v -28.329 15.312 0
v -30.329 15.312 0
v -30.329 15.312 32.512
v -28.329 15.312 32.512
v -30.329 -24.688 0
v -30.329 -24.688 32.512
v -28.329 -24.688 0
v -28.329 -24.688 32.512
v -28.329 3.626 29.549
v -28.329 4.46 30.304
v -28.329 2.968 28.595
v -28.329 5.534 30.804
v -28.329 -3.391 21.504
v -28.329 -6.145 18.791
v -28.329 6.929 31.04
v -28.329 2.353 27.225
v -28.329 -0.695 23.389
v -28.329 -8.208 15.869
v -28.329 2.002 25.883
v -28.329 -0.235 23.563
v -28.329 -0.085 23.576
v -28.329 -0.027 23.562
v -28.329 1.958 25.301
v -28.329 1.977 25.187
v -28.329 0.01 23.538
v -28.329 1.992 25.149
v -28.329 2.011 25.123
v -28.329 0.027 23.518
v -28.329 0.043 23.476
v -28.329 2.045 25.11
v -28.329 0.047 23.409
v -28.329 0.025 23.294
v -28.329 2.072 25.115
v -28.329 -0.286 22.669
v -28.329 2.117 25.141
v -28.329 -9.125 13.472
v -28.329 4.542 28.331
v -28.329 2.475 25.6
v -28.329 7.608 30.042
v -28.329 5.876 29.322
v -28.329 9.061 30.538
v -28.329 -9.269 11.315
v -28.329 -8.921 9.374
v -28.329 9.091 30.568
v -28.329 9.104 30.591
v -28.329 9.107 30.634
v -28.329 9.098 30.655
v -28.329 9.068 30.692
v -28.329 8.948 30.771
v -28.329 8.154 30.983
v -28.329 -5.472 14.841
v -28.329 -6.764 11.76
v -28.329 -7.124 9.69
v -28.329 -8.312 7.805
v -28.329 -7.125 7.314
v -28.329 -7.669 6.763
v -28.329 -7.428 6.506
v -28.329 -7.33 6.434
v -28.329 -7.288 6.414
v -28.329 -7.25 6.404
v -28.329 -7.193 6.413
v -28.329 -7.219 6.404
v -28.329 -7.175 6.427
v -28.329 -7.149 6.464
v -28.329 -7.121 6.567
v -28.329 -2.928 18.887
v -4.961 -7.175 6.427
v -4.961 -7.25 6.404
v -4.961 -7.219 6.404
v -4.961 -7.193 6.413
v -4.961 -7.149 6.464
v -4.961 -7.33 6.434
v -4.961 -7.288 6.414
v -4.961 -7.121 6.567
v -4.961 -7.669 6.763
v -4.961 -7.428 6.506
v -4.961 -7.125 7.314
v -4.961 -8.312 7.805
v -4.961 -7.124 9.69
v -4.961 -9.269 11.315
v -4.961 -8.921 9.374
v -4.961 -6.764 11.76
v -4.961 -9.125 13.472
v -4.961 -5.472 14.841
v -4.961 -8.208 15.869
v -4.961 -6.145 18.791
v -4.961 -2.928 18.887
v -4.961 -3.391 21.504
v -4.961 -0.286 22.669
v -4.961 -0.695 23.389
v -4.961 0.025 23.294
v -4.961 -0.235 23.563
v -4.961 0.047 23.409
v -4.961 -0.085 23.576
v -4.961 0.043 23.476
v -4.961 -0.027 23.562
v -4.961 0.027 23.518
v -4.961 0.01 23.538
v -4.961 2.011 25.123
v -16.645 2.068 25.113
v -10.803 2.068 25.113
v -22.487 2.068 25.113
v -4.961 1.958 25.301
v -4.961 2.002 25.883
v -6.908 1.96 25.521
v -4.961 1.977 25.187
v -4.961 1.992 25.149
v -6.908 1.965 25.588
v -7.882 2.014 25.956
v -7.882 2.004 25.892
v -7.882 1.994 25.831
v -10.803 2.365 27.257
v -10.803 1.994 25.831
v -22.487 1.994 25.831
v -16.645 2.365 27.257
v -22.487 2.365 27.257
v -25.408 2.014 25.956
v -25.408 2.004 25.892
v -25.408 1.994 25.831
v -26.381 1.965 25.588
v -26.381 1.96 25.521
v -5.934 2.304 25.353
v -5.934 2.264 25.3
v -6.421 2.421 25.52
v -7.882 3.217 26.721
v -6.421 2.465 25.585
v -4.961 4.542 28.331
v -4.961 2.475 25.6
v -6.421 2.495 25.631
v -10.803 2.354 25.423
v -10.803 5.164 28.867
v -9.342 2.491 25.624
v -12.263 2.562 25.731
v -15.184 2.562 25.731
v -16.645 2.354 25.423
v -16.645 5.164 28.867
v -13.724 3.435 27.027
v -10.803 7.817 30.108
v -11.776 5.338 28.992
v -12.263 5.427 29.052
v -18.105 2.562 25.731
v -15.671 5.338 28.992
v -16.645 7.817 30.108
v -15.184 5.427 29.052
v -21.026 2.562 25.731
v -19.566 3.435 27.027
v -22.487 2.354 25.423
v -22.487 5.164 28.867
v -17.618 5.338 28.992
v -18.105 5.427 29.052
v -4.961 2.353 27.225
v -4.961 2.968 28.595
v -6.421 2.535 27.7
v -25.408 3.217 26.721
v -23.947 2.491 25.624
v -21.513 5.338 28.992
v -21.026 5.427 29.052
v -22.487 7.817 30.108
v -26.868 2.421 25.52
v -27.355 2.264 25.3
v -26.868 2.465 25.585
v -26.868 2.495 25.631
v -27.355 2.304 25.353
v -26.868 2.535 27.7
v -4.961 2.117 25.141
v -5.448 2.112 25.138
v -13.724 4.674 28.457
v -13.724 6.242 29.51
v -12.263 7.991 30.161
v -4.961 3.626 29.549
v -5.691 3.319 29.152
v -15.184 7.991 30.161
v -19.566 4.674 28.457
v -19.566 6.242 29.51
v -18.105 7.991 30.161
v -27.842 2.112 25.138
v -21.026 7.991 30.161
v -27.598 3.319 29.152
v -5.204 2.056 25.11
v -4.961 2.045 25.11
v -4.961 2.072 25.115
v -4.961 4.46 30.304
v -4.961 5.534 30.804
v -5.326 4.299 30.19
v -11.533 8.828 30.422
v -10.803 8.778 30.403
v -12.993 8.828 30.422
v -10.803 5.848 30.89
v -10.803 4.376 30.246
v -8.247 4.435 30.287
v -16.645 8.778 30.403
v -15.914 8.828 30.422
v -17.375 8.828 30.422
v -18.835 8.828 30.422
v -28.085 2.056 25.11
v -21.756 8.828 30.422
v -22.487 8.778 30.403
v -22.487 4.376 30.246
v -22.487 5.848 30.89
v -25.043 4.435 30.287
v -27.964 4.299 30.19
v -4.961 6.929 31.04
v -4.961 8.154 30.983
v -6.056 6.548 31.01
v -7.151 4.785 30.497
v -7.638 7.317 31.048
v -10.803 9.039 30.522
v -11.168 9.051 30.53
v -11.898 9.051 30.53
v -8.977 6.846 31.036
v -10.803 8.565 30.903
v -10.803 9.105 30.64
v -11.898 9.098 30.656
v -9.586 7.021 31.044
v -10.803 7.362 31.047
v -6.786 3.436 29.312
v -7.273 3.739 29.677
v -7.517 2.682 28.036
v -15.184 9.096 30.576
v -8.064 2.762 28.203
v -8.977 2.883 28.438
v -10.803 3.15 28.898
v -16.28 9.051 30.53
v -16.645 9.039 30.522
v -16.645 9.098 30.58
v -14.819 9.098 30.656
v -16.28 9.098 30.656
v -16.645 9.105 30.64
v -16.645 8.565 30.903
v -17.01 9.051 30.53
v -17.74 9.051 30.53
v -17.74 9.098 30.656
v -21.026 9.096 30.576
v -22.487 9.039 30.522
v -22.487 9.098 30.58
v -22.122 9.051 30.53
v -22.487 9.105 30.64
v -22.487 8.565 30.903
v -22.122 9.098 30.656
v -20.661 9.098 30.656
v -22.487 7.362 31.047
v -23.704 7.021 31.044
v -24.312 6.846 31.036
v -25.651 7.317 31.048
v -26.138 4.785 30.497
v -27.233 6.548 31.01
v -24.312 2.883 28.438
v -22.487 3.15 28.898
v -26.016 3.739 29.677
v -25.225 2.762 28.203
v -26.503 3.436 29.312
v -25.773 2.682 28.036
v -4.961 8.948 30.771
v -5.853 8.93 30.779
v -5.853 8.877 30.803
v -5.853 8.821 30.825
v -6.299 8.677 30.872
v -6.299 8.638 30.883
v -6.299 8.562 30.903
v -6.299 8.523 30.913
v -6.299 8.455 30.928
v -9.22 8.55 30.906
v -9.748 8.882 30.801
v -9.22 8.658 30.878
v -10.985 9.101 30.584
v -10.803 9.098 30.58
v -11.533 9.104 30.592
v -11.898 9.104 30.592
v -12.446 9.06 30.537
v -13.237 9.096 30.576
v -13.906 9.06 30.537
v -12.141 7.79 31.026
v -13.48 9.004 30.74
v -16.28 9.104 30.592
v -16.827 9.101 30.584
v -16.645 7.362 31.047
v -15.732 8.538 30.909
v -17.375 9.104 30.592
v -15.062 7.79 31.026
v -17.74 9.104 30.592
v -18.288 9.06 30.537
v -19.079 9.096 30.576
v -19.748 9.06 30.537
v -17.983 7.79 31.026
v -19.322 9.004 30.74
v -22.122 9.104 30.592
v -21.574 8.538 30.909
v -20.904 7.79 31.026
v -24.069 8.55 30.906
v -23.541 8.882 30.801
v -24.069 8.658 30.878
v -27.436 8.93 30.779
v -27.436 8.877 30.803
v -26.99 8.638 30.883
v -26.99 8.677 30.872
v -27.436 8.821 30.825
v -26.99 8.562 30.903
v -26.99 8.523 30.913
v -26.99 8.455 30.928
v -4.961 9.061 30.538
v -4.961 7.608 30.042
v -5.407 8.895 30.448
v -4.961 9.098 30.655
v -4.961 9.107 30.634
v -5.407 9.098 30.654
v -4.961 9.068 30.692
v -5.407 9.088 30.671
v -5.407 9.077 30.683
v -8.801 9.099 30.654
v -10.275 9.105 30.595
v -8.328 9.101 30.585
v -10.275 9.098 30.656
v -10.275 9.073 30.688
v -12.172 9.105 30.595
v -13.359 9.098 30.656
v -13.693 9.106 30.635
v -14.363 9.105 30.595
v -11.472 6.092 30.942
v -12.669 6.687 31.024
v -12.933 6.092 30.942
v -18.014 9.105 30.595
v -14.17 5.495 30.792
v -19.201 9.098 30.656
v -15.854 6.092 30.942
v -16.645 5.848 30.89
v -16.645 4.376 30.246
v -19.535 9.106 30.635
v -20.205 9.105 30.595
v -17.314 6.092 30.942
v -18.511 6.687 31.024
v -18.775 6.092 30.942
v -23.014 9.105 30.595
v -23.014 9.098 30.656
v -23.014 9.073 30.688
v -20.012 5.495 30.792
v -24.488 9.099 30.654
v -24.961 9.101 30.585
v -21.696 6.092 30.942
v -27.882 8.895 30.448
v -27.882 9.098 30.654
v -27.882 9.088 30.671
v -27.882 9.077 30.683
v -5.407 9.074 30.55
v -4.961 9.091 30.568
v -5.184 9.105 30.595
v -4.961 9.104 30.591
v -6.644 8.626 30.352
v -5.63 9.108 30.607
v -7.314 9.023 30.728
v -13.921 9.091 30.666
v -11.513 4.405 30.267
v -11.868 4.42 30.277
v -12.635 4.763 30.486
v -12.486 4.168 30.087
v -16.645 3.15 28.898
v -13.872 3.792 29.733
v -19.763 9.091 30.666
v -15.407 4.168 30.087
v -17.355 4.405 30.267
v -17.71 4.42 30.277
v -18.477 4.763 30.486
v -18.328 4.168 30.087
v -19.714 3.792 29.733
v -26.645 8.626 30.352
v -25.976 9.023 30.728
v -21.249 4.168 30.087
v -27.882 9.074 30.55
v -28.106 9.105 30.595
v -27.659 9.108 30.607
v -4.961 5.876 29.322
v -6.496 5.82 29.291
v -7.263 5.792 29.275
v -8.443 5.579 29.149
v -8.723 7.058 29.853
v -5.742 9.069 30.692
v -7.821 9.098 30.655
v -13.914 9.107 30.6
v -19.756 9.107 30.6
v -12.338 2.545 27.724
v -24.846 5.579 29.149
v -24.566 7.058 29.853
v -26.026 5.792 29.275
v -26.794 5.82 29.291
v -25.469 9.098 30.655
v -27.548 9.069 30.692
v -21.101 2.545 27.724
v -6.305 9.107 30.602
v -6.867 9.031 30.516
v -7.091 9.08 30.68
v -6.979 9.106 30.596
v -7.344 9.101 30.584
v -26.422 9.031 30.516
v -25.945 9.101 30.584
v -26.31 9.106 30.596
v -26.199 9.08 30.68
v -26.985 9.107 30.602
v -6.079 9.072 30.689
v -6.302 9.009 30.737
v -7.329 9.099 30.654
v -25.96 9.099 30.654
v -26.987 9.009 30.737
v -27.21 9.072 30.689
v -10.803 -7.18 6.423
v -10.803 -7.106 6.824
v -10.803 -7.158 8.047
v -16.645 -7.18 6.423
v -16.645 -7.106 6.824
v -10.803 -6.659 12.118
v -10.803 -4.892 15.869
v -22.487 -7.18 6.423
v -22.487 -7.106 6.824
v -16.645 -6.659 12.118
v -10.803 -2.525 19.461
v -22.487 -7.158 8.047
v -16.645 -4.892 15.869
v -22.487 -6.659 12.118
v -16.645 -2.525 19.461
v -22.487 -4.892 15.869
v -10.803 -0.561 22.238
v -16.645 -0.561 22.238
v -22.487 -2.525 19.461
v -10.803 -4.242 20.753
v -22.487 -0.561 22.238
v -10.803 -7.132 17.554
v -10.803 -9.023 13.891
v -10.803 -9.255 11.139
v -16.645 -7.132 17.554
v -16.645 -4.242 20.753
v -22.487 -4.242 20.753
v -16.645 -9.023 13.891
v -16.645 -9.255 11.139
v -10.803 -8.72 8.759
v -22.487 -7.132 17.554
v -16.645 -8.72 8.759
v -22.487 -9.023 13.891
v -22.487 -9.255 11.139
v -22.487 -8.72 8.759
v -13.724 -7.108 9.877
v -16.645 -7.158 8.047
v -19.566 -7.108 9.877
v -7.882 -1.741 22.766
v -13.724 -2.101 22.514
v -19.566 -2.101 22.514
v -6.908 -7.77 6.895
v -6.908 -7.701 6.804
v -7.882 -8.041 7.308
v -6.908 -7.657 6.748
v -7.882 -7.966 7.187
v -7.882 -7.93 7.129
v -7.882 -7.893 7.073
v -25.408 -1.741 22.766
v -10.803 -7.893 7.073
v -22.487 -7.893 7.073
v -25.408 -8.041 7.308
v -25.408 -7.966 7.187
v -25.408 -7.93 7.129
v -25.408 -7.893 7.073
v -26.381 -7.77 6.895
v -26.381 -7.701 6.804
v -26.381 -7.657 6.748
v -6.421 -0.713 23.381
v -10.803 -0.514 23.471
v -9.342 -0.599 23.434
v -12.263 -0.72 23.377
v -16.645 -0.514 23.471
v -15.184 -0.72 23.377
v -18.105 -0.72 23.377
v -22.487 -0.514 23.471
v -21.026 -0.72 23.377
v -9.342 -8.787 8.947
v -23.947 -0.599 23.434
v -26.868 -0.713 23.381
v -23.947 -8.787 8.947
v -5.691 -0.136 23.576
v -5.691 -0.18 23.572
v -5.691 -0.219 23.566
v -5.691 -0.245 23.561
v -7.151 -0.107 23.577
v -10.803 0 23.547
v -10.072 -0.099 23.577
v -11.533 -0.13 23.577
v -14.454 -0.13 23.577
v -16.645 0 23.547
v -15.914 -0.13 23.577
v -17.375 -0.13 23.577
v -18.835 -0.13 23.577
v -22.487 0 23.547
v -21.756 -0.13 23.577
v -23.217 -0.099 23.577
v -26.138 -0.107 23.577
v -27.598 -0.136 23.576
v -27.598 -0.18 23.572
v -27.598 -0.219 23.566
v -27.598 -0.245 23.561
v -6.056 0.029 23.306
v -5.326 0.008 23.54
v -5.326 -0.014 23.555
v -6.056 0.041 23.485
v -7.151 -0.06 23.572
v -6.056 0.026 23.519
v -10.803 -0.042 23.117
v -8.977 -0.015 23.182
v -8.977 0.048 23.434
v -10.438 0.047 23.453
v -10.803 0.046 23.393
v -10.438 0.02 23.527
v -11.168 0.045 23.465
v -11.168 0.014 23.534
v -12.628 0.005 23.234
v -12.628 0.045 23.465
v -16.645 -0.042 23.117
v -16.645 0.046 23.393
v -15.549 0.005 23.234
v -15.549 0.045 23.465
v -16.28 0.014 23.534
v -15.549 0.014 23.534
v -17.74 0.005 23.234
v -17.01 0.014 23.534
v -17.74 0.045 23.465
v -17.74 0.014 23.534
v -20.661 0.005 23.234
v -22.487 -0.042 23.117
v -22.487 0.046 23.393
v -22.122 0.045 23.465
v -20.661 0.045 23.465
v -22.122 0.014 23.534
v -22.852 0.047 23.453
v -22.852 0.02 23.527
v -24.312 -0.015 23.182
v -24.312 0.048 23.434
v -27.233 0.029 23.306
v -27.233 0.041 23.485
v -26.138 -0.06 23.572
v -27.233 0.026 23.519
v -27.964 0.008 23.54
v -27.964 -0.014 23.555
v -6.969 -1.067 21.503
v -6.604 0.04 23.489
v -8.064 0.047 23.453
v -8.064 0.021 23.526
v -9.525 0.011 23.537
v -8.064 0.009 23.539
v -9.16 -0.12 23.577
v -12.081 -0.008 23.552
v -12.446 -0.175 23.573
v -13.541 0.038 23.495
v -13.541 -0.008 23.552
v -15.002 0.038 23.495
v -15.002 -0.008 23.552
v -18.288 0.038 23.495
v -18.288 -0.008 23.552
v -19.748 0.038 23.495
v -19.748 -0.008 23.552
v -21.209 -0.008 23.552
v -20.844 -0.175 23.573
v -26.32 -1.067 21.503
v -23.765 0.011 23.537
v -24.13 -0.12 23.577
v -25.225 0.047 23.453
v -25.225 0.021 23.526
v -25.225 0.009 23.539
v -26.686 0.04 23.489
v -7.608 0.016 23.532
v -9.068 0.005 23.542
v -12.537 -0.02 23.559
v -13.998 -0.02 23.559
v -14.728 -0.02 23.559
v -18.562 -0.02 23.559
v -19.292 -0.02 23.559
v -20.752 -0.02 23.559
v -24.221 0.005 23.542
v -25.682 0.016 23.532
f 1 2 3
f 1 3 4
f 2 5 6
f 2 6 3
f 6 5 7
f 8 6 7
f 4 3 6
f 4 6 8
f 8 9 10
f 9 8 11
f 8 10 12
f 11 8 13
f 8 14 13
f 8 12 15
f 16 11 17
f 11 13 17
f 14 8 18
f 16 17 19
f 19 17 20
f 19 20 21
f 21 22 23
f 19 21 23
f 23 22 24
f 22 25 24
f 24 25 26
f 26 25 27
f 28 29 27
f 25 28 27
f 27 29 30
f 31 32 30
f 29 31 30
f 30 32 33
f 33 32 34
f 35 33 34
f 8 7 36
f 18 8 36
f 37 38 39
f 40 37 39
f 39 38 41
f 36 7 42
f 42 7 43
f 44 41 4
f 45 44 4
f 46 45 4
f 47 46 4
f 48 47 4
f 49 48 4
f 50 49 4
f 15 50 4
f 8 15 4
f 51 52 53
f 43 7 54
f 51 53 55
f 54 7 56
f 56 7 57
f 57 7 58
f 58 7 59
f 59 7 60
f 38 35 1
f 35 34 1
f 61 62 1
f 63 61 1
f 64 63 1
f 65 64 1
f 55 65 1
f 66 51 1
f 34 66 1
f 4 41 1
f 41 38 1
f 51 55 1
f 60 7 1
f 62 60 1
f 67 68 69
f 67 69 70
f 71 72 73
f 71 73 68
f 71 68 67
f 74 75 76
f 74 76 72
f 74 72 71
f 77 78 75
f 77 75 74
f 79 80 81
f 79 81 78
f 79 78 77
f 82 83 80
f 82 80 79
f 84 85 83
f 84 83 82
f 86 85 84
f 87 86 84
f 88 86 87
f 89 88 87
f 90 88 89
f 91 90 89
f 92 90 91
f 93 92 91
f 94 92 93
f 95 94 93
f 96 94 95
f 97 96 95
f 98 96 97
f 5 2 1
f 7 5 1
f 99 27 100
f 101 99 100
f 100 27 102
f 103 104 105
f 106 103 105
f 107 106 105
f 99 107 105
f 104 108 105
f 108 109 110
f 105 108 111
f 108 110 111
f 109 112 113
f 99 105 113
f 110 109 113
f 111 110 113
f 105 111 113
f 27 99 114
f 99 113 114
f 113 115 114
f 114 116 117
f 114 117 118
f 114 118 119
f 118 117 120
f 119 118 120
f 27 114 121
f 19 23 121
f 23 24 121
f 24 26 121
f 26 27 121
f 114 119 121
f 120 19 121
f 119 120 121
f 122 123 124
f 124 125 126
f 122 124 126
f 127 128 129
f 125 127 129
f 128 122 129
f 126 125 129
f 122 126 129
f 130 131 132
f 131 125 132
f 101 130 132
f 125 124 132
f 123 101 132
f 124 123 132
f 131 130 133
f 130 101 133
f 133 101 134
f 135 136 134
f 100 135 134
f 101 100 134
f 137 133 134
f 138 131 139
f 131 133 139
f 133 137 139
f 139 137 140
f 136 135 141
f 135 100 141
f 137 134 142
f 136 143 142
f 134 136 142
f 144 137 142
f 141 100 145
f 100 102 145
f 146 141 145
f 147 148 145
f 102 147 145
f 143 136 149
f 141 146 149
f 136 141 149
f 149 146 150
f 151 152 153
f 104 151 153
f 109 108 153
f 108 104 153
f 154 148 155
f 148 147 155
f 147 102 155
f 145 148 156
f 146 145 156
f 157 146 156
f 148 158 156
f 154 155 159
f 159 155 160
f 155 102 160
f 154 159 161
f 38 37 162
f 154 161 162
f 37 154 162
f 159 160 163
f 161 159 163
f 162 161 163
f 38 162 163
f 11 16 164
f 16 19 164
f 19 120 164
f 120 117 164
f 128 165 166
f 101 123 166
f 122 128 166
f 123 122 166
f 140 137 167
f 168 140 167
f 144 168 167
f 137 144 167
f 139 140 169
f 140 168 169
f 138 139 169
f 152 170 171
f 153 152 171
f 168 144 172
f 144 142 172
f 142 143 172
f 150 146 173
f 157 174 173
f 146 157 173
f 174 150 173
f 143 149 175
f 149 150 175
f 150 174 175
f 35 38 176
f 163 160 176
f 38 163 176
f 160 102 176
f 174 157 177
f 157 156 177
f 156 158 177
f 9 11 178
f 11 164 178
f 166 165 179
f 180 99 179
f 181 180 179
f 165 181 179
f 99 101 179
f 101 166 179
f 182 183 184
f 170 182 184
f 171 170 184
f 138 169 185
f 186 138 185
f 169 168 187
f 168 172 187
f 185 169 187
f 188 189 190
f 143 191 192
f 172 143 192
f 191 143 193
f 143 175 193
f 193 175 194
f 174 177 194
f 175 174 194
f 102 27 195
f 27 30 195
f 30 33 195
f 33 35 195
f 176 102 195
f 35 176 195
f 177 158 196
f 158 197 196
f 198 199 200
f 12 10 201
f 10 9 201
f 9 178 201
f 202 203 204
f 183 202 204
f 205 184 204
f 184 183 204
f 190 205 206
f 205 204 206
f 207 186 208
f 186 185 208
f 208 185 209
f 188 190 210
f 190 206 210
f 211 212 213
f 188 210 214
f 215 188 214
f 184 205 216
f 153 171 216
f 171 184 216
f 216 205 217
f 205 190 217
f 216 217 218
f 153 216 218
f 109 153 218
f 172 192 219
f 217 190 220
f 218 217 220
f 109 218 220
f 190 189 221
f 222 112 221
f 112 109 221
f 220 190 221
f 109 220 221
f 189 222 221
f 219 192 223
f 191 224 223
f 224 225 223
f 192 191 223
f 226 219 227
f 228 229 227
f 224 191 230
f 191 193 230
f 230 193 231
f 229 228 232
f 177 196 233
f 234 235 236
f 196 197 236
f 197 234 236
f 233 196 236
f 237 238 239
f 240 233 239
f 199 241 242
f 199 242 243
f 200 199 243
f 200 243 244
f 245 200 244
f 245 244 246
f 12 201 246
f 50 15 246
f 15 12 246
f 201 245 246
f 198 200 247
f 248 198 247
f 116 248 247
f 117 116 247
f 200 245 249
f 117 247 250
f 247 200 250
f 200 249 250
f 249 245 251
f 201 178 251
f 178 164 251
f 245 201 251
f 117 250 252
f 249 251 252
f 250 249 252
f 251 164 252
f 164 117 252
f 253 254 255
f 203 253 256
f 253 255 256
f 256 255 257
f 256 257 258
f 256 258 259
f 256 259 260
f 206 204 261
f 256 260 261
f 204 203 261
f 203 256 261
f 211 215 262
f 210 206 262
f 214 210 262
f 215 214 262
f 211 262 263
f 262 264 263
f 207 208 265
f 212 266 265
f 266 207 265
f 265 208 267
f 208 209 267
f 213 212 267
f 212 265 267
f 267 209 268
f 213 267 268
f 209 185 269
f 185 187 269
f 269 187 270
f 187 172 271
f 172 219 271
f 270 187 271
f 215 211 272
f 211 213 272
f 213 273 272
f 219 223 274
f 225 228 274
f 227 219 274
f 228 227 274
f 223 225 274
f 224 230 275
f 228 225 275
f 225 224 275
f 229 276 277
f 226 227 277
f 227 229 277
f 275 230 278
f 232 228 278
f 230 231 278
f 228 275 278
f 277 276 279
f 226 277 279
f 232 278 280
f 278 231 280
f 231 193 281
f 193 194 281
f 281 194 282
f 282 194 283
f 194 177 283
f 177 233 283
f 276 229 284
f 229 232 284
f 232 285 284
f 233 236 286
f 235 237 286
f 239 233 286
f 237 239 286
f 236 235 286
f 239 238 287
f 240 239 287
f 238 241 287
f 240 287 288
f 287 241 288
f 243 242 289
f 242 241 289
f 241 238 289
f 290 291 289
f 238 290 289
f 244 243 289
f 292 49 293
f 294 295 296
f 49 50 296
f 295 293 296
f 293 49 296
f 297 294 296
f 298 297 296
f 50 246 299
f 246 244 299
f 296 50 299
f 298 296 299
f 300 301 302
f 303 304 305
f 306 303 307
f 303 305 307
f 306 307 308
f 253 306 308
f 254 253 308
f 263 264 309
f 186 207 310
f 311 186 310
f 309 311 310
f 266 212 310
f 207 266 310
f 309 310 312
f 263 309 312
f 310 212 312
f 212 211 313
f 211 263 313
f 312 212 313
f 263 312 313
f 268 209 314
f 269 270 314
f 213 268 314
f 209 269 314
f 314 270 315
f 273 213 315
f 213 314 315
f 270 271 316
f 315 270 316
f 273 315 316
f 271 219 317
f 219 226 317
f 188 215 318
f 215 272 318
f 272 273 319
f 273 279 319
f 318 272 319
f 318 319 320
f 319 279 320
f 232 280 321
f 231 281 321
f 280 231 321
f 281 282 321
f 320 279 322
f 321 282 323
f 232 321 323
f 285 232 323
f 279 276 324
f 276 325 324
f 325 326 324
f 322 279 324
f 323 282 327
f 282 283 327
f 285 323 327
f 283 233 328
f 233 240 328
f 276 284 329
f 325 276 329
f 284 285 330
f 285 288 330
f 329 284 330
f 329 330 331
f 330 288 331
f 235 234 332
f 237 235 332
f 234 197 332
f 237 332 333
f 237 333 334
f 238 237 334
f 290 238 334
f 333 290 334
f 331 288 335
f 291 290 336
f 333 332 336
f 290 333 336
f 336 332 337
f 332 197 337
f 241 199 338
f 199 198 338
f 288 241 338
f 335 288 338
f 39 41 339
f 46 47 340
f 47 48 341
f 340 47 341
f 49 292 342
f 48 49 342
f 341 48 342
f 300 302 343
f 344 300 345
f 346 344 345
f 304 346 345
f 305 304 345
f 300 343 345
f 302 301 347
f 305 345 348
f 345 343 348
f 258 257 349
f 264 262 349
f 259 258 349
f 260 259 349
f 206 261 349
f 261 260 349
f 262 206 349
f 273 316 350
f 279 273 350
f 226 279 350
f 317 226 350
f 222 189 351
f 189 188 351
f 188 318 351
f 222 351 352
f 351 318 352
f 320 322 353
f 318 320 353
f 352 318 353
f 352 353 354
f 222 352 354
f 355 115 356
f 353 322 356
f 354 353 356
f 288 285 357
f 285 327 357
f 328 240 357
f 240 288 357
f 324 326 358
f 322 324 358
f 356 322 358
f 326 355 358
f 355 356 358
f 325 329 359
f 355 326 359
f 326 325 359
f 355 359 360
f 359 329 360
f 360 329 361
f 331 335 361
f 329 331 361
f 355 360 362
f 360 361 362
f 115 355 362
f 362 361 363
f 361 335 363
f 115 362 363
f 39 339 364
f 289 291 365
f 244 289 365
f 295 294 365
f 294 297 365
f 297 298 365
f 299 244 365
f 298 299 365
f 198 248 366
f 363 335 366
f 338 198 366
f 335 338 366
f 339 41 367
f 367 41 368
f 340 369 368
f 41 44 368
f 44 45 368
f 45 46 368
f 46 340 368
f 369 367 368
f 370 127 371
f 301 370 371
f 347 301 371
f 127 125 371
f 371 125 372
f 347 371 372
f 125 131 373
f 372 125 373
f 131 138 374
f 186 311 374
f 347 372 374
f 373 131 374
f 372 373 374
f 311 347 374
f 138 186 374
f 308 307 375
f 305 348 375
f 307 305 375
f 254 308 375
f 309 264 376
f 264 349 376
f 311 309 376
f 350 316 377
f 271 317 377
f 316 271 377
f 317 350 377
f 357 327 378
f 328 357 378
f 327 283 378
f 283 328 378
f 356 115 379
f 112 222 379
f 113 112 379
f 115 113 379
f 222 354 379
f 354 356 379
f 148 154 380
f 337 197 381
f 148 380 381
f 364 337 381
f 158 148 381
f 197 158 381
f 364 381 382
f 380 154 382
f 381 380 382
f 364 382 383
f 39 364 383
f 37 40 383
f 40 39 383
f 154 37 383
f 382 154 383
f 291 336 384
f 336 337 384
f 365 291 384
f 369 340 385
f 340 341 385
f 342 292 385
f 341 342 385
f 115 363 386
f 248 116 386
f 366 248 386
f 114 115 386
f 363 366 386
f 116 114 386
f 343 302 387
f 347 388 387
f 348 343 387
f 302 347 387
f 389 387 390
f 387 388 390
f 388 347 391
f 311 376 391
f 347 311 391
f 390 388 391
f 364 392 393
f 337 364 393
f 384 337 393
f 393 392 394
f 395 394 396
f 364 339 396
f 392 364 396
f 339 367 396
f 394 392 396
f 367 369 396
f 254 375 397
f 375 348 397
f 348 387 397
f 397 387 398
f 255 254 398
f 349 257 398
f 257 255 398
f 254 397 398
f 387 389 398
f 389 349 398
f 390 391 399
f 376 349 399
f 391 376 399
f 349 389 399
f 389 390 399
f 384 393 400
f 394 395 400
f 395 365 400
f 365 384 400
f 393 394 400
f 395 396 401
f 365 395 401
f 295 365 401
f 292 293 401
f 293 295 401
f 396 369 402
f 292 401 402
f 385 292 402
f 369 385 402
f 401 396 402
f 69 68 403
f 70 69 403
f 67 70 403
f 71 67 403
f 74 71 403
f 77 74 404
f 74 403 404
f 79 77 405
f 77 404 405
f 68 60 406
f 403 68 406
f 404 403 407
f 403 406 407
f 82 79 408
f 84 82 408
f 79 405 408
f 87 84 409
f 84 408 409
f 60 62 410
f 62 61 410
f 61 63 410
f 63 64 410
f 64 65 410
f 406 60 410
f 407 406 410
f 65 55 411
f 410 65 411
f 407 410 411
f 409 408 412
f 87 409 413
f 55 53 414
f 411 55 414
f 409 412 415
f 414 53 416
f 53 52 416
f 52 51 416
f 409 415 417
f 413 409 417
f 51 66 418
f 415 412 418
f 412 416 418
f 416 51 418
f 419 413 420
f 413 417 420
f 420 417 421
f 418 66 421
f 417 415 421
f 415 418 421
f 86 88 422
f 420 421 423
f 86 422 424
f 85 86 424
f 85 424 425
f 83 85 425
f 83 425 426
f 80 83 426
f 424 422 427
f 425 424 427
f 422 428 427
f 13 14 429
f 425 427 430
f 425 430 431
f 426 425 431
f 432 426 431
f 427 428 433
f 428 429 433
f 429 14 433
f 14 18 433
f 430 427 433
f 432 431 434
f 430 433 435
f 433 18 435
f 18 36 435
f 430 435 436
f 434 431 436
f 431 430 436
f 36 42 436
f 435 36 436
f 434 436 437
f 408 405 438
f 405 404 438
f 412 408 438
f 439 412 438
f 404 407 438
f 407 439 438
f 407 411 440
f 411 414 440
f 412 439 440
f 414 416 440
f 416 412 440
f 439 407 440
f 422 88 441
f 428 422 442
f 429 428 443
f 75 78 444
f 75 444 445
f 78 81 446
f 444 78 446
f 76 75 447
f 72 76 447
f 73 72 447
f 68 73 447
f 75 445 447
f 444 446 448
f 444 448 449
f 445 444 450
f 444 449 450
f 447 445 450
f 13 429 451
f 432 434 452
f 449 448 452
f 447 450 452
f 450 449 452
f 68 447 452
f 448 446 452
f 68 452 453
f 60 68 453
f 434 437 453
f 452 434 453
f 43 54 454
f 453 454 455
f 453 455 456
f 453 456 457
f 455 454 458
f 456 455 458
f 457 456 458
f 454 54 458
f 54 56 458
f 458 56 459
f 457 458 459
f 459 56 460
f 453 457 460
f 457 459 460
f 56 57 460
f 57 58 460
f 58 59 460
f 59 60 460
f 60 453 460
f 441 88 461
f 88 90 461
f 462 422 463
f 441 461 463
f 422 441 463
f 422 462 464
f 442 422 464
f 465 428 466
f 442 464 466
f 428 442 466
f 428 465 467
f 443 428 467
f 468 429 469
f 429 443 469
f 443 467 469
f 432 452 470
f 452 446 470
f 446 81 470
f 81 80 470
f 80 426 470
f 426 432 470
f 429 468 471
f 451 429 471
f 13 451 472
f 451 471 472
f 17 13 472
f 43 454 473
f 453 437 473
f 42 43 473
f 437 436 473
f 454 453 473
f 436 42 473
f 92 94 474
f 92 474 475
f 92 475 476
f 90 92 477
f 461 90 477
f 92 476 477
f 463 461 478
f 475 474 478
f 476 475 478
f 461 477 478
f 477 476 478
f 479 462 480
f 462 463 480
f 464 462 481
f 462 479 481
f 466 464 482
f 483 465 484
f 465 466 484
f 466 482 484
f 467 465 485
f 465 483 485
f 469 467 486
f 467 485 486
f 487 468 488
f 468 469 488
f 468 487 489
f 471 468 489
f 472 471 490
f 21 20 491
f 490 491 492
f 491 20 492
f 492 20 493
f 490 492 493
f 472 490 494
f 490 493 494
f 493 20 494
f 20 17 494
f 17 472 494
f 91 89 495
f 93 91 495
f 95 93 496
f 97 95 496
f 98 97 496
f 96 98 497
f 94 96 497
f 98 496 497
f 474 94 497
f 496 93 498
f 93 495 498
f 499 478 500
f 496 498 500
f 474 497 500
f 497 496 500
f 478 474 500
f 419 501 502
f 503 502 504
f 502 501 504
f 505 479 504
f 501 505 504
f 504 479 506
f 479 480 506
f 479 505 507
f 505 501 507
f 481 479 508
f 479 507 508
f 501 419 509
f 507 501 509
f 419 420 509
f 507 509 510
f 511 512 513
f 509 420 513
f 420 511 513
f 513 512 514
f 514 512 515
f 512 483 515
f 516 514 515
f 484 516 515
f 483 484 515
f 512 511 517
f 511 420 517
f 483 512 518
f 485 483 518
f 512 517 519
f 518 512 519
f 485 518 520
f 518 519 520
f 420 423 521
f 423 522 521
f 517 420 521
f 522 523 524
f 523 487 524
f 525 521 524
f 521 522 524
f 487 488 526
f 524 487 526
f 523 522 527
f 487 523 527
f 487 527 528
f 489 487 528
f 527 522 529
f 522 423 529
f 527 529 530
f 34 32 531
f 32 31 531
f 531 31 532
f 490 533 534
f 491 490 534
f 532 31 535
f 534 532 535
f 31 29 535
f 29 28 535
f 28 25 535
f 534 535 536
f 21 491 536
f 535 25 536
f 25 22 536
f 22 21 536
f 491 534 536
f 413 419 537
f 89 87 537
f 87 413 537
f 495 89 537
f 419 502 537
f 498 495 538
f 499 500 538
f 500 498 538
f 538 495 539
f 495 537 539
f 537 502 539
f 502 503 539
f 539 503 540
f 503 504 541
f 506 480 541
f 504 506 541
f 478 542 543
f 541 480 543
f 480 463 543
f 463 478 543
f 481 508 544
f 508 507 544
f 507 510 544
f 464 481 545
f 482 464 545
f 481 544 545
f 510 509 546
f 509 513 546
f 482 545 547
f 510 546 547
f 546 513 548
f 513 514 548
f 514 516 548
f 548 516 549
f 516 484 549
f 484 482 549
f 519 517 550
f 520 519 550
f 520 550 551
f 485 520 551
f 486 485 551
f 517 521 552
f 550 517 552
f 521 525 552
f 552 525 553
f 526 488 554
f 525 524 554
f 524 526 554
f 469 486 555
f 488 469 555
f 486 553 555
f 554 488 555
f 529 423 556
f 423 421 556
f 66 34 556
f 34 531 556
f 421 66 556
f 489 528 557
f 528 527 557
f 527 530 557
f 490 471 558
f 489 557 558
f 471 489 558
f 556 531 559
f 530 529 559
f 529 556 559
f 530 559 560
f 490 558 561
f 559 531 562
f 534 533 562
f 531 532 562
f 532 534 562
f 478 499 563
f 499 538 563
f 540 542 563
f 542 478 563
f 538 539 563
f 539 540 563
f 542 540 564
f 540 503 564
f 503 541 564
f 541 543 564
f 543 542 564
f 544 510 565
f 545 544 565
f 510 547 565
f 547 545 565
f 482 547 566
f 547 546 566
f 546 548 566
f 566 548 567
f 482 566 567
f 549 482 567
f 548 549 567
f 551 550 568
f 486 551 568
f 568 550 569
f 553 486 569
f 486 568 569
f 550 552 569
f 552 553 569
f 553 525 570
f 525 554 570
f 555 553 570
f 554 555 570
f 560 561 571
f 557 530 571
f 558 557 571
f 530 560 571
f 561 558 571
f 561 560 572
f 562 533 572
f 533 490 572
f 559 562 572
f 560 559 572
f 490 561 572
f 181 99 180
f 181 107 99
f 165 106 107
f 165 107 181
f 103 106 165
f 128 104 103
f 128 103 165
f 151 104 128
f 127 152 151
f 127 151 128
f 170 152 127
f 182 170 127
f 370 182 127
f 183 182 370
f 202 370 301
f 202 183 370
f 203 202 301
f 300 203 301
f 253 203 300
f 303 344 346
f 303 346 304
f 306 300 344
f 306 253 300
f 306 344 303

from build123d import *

# Parameters (mm, degrees)
F0_W     = 2
F0_H     = 40
F1_DEPTH = 32.512
F4_DEPTH = 23.368
F5_DEPTH = 23.368


with BuildPart() as f1:
    # F0 (on Top) → F1 (new body)
    with BuildSketch(Plane.XY):
        with Locations((-29.3286769457, -4.6882890165)):
            Rectangle(F0_W, F0_H)
    extrude(amount=F1_DEPTH)

    # F2 (on face) → F4 (join)
    with BuildSketch(Plane.YZ.offset(-28.3286769457)):
        with BuildLine():
            add(Edge.make_bspline(
                [(-7.2498763911, 6.4037409611), (-6.7968060002, 6.3416258929), (-8.9566216359, 12.8911335708), (6.4100905567, 29.2054242189), (-13.0431466461, 14.8857573284), (-7.7742350092, 6.4756295065), (-7.2498763911, 6.4037409611)],
                knots=[0, 0, 0, 0, 0.1926255925, 0.4849103443, 0.7770657904, 1, 1, 1, 1], degree=3))
        make_face()
    extrude(amount=F4_DEPTH)

    # F3 (on face) → F5 (join)
    with BuildSketch(Plane.YZ.offset(-28.3286769457)):
        with BuildLine():
            add(Edge.make_bspline(
                [(2.0112469792, 25.1230336726), (2.2621760216, 24.9001418505), (4.3688694301, 29.9626783783), (11.6831212131, 30.4862882962), (3.0711443223, 32.0820507404), (1.7418249366, 25.3623522043), (2.0112469792, 25.1230336726)],
                knots=[0, 0, 0, 0, 0.2501247989, 0.4851539395, 0.7314414721, 1, 1, 1, 1], degree=3))
        make_face()
    extrude(amount=F5_DEPTH)


solid = f1.part
